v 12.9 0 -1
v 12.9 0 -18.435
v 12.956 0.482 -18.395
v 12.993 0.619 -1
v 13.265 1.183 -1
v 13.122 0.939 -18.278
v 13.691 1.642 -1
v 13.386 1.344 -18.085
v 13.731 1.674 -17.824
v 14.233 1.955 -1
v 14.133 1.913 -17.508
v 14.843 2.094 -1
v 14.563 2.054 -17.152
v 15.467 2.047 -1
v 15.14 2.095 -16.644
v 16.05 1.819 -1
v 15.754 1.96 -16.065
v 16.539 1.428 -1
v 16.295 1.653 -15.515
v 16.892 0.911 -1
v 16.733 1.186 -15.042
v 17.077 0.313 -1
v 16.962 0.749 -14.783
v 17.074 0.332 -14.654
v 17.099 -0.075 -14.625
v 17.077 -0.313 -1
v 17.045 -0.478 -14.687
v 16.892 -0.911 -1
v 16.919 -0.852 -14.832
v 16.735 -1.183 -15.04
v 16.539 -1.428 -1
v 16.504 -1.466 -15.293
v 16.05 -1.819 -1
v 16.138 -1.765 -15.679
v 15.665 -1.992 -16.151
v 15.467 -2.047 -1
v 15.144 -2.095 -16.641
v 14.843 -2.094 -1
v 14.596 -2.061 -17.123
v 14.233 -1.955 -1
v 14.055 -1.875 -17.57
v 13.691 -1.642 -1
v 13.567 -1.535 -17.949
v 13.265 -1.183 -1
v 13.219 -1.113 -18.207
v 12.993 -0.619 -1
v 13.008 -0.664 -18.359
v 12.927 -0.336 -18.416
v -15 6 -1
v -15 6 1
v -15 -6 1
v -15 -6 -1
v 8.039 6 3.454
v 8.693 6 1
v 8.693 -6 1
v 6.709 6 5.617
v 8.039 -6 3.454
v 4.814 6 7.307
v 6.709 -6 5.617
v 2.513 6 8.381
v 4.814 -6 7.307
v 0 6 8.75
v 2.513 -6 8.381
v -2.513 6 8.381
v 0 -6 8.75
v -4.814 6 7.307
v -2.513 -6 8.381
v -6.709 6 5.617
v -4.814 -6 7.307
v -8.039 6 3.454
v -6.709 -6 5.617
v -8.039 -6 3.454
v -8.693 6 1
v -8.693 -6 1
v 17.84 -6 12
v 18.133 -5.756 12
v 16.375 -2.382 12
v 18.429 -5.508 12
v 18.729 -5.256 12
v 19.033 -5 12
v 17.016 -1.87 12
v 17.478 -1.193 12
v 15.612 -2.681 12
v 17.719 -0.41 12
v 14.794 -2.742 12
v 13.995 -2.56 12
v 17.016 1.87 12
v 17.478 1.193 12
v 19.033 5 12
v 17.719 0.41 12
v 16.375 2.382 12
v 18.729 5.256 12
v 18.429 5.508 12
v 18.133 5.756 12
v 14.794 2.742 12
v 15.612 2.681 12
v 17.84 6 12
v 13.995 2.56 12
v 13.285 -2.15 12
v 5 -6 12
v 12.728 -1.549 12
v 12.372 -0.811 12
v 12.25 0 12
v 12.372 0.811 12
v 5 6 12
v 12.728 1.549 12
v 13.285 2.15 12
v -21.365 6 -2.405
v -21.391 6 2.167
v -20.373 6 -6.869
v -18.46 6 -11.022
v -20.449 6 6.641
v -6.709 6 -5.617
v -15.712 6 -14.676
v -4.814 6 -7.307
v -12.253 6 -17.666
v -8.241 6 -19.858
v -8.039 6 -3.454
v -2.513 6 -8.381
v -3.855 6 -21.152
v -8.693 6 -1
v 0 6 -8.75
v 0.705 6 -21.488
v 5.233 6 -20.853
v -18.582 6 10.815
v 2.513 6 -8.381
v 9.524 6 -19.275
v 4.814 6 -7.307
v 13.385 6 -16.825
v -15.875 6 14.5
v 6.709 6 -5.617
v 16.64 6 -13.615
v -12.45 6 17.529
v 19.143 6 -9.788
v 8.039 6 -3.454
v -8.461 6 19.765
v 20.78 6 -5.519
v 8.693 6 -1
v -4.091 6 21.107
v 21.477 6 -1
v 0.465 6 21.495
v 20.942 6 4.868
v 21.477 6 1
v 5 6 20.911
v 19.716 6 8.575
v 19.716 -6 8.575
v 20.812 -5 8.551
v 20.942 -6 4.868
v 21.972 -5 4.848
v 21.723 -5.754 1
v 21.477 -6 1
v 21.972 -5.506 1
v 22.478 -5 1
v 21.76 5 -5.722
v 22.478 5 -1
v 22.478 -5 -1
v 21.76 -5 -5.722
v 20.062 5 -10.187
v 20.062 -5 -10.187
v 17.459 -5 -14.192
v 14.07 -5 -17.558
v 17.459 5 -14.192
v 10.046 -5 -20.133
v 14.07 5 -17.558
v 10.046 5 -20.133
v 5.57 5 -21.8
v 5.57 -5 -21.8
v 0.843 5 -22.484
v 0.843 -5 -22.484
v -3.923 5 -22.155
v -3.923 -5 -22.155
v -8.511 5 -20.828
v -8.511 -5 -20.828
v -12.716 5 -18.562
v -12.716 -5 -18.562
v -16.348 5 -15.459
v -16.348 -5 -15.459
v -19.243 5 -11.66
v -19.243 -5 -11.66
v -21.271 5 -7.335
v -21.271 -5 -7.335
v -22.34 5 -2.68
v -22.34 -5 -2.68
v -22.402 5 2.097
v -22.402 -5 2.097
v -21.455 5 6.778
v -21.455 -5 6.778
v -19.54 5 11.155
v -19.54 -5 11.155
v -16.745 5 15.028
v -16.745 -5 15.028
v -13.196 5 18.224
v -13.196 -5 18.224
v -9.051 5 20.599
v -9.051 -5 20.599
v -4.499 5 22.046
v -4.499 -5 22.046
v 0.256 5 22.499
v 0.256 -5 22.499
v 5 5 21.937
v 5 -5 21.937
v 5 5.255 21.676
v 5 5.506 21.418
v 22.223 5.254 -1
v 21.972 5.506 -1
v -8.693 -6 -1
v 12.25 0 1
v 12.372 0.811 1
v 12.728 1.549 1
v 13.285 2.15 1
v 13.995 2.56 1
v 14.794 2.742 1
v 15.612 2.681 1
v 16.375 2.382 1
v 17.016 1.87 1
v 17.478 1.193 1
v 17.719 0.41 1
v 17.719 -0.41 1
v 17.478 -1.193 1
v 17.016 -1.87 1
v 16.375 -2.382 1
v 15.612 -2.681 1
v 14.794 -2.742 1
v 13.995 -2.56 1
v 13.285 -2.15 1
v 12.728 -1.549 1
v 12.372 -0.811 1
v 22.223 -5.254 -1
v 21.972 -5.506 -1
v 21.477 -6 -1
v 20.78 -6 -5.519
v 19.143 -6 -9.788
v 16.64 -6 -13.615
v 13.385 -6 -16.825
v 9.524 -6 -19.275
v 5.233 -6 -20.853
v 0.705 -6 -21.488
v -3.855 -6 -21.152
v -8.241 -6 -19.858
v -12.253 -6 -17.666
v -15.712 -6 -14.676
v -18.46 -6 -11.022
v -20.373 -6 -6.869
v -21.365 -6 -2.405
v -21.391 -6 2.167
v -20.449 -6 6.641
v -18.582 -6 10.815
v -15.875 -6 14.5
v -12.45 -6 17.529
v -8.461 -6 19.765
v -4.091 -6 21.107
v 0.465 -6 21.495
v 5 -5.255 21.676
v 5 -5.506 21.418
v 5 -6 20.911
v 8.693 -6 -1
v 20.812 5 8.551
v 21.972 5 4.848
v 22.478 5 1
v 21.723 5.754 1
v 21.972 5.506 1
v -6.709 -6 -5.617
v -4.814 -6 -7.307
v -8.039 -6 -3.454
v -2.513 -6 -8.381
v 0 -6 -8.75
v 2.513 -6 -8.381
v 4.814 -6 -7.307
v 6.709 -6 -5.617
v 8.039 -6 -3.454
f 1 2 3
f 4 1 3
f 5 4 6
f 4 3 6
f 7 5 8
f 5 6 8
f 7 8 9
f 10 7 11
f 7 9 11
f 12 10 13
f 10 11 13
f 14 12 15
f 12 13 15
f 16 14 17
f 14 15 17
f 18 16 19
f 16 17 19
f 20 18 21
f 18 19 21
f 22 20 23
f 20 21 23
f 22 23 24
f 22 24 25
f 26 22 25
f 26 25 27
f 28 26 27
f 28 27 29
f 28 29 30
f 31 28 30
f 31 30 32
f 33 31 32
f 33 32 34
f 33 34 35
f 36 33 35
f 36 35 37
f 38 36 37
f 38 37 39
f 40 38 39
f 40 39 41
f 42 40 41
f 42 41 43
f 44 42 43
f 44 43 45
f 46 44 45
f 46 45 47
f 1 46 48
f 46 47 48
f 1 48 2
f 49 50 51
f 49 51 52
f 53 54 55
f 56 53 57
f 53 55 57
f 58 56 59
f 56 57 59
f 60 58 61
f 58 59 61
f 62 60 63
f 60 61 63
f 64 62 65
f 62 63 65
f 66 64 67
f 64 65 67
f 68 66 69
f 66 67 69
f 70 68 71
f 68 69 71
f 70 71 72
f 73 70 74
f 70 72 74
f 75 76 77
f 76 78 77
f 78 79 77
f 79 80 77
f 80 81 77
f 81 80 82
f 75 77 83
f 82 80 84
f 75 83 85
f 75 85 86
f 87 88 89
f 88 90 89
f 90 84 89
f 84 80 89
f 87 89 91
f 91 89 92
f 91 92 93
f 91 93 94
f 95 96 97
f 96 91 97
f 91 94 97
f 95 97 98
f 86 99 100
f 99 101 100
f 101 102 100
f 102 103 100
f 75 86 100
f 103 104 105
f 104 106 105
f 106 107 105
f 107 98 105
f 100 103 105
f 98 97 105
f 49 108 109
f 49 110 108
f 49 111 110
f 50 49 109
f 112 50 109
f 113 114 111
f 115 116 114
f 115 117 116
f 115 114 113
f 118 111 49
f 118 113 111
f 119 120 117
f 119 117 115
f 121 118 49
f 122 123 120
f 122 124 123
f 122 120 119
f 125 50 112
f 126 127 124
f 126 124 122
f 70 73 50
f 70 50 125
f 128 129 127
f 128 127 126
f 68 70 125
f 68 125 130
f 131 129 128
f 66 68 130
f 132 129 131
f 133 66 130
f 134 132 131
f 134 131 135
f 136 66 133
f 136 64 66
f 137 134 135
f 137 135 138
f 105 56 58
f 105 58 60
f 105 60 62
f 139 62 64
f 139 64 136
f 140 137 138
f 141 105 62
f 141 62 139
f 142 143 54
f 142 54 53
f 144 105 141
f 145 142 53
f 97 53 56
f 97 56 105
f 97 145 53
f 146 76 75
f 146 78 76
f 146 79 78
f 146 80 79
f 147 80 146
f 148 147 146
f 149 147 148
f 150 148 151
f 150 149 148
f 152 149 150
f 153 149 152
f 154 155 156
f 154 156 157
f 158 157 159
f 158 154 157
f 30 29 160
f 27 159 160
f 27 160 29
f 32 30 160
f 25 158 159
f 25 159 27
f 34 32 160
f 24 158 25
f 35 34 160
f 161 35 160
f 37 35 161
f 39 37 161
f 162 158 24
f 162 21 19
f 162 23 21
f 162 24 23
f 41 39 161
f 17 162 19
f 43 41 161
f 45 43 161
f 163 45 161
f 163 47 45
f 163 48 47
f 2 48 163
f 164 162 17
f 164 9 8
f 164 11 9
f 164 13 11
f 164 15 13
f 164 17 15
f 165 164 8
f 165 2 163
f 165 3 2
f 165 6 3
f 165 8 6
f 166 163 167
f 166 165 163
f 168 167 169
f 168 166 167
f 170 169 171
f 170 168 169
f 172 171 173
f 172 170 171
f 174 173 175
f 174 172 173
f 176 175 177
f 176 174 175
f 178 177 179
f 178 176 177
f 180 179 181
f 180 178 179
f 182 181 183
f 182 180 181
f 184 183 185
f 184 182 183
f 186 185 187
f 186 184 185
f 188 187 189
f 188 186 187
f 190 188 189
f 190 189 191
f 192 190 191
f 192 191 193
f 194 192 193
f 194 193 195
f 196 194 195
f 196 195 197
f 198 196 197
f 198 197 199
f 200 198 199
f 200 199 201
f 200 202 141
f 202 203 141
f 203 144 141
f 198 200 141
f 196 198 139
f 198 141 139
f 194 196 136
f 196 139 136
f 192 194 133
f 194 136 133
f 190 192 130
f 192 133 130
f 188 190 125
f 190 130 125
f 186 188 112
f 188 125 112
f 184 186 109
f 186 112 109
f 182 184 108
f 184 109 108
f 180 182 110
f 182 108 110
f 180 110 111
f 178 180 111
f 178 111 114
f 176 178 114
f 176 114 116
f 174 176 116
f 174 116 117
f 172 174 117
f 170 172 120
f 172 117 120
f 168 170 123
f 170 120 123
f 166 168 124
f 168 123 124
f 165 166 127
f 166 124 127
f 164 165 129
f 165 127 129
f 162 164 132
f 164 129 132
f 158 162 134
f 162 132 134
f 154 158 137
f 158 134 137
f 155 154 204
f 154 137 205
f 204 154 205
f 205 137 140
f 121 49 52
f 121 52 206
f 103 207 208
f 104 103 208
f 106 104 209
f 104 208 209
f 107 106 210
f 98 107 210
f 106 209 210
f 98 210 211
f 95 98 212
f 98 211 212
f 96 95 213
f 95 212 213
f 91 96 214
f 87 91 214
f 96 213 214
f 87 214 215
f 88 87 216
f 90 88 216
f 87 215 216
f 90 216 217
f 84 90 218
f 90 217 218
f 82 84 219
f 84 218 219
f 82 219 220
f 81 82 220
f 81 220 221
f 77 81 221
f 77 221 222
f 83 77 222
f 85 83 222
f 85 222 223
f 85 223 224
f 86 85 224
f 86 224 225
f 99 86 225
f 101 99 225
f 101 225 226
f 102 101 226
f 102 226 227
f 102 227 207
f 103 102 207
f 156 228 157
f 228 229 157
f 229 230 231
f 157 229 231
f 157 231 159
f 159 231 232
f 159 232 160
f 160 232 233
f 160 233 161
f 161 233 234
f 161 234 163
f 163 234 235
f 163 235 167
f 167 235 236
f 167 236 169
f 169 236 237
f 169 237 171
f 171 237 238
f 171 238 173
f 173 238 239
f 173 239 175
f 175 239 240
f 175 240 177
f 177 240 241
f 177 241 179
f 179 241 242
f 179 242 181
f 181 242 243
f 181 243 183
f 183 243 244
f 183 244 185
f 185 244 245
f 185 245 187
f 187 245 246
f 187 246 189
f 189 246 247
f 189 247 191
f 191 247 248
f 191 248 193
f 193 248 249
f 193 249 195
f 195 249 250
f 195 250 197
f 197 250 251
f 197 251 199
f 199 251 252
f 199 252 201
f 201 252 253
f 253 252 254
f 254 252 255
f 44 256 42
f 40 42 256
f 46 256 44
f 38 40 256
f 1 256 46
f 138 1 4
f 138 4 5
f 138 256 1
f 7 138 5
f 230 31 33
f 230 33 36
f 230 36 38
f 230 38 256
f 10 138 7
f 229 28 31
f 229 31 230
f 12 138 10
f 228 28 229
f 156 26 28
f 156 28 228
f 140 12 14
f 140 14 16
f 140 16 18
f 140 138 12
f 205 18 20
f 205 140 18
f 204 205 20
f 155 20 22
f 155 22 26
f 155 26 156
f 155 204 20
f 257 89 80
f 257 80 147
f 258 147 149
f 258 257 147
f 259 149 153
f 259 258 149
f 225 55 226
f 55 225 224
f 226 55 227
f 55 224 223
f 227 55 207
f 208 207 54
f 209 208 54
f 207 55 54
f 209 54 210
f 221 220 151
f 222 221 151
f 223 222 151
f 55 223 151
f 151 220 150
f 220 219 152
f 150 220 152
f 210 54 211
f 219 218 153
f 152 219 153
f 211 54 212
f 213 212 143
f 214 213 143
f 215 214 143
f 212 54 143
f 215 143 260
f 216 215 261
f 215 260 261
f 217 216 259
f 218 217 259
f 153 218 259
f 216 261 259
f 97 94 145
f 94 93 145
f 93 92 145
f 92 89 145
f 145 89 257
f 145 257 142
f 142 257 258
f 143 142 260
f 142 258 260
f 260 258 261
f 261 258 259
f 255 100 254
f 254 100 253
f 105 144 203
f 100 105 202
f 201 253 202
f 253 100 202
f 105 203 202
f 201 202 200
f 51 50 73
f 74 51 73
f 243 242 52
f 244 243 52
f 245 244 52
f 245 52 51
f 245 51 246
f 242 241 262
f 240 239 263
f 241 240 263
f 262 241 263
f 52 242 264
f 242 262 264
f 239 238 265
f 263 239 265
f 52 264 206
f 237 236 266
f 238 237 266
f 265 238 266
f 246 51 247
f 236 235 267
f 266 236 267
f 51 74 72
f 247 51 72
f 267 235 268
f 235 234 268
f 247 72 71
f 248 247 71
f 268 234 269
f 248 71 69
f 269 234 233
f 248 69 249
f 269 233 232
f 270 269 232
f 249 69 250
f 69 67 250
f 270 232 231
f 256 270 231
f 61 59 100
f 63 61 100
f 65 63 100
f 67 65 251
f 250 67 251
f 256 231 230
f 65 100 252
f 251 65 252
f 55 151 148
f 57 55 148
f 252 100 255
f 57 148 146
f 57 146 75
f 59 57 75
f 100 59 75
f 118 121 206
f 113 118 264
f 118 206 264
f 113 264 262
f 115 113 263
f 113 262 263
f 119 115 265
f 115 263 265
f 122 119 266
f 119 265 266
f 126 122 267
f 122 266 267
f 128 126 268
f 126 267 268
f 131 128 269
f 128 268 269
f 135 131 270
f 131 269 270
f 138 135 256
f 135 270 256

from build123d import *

# Parameters (mm, degrees)
SKETCH_1_R                  = 22.5
EXTRUDE_1_DEPTH             = 6
HOLE_WIZARD_M20_1_D         = 17.5
SKETCH_2_W                  = 37.5
SKETCH_2_H                  = 2
CUT_EXTRUDE_1_DEPTH         = 35.007352146
CUT_EXTRUDE_2_DEPTH         = 35.007352146
HOLE_WIZARD_5_5_5_5_1_D     = 5.5
HOLE_WIZARD_5_5_5_5_1_DEPTH = 11
HOLE_WIZARD_M5_2_D          = 4.2
CHAMFER_1_SIZE              = 1


with BuildPart() as part:
    # 草图1 → 凸台-拉伸1 (new, symmetric)
    with BuildSketch(Plane(origin=(0, 0, 0), x_dir=(1, 0, 0), z_dir=(0, 1, 0))):
        with Locations(Location((0, 0, 0), (0, 0, 270))):
            Circle(SKETCH_1_R)
    extrude(amount=EXTRUDE_1_DEPTH, both=True)

    # M20 螺纹孔1 (through all)
    with Locations(Plane(origin=(0, 6, 0), x_dir=(1, 0, 0), z_dir=(0, 1, 0))):
        with Locations((0, 0)):
            Hole(HOLE_WIZARD_M20_1_D / 2)

    # 草图2 → 切除-拉伸1 (cut, through all)
    with BuildSketch(Plane(origin=(0, 6, 0), x_dir=(1, 0, 0), z_dir=(0, 1, 0))):
        with Locations((3.75, 0)):
            Rectangle(SKETCH_2_W, SKETCH_2_H)
    extrude(amount=-CUT_EXTRUDE_1_DEPTH, mode=Mode.SUBTRACT)

    # 草图6 → 切除-拉伸2 (cut, through all)
    with BuildSketch(Plane(origin=(0, 6, 0), x_dir=(1, 0, 0), z_dir=(0, 1, 0))):
        with BuildLine():
            Line((19.032866311, -12), (5, -12))
            Line((5, -12), (5, -21.937410968))
            ThreePointArc((5, -21.937410968), (13.003180379, -18.362115892), (19.032866311, -12))
        make_face()
    extrude(amount=-CUT_EXTRUDE_2_DEPTH, mode=Mode.SUBTRACT)

    # Ø5.5 (5.5) 直径孔1
    with Locations(Plane.XY.offset(12)):
        with Locations((15, 0)):
            Hole(HOLE_WIZARD_5_5_5_5_1_D / 2, depth=HOLE_WIZARD_5_5_5_5_1_DEPTH)

    # M5 螺纹孔2 (through all)
    with Locations(Plane(origin=(-28, -6, -1), x_dir=(1, 0, 0), z_dir=(0, 0, 1))):
        with Locations((43, 6)):
            Hole(HOLE_WIZARD_M5_2_D / 2)

    # 倒角1
    chamfer_1_edges = [part.edges().sort_by_distance(p)[0] for p in [
        (-17.896595276, -6, -13.636783988),
        (-17.896595276, 6, -13.636783988),
        (21.471682868, -6, 6.724346424),
        (21.471682868, 6, 6.724346424),
    ]]
    chamfer(chamfer_1_edges, length=CHAMFER_1_SIZE)


solid = part.part
